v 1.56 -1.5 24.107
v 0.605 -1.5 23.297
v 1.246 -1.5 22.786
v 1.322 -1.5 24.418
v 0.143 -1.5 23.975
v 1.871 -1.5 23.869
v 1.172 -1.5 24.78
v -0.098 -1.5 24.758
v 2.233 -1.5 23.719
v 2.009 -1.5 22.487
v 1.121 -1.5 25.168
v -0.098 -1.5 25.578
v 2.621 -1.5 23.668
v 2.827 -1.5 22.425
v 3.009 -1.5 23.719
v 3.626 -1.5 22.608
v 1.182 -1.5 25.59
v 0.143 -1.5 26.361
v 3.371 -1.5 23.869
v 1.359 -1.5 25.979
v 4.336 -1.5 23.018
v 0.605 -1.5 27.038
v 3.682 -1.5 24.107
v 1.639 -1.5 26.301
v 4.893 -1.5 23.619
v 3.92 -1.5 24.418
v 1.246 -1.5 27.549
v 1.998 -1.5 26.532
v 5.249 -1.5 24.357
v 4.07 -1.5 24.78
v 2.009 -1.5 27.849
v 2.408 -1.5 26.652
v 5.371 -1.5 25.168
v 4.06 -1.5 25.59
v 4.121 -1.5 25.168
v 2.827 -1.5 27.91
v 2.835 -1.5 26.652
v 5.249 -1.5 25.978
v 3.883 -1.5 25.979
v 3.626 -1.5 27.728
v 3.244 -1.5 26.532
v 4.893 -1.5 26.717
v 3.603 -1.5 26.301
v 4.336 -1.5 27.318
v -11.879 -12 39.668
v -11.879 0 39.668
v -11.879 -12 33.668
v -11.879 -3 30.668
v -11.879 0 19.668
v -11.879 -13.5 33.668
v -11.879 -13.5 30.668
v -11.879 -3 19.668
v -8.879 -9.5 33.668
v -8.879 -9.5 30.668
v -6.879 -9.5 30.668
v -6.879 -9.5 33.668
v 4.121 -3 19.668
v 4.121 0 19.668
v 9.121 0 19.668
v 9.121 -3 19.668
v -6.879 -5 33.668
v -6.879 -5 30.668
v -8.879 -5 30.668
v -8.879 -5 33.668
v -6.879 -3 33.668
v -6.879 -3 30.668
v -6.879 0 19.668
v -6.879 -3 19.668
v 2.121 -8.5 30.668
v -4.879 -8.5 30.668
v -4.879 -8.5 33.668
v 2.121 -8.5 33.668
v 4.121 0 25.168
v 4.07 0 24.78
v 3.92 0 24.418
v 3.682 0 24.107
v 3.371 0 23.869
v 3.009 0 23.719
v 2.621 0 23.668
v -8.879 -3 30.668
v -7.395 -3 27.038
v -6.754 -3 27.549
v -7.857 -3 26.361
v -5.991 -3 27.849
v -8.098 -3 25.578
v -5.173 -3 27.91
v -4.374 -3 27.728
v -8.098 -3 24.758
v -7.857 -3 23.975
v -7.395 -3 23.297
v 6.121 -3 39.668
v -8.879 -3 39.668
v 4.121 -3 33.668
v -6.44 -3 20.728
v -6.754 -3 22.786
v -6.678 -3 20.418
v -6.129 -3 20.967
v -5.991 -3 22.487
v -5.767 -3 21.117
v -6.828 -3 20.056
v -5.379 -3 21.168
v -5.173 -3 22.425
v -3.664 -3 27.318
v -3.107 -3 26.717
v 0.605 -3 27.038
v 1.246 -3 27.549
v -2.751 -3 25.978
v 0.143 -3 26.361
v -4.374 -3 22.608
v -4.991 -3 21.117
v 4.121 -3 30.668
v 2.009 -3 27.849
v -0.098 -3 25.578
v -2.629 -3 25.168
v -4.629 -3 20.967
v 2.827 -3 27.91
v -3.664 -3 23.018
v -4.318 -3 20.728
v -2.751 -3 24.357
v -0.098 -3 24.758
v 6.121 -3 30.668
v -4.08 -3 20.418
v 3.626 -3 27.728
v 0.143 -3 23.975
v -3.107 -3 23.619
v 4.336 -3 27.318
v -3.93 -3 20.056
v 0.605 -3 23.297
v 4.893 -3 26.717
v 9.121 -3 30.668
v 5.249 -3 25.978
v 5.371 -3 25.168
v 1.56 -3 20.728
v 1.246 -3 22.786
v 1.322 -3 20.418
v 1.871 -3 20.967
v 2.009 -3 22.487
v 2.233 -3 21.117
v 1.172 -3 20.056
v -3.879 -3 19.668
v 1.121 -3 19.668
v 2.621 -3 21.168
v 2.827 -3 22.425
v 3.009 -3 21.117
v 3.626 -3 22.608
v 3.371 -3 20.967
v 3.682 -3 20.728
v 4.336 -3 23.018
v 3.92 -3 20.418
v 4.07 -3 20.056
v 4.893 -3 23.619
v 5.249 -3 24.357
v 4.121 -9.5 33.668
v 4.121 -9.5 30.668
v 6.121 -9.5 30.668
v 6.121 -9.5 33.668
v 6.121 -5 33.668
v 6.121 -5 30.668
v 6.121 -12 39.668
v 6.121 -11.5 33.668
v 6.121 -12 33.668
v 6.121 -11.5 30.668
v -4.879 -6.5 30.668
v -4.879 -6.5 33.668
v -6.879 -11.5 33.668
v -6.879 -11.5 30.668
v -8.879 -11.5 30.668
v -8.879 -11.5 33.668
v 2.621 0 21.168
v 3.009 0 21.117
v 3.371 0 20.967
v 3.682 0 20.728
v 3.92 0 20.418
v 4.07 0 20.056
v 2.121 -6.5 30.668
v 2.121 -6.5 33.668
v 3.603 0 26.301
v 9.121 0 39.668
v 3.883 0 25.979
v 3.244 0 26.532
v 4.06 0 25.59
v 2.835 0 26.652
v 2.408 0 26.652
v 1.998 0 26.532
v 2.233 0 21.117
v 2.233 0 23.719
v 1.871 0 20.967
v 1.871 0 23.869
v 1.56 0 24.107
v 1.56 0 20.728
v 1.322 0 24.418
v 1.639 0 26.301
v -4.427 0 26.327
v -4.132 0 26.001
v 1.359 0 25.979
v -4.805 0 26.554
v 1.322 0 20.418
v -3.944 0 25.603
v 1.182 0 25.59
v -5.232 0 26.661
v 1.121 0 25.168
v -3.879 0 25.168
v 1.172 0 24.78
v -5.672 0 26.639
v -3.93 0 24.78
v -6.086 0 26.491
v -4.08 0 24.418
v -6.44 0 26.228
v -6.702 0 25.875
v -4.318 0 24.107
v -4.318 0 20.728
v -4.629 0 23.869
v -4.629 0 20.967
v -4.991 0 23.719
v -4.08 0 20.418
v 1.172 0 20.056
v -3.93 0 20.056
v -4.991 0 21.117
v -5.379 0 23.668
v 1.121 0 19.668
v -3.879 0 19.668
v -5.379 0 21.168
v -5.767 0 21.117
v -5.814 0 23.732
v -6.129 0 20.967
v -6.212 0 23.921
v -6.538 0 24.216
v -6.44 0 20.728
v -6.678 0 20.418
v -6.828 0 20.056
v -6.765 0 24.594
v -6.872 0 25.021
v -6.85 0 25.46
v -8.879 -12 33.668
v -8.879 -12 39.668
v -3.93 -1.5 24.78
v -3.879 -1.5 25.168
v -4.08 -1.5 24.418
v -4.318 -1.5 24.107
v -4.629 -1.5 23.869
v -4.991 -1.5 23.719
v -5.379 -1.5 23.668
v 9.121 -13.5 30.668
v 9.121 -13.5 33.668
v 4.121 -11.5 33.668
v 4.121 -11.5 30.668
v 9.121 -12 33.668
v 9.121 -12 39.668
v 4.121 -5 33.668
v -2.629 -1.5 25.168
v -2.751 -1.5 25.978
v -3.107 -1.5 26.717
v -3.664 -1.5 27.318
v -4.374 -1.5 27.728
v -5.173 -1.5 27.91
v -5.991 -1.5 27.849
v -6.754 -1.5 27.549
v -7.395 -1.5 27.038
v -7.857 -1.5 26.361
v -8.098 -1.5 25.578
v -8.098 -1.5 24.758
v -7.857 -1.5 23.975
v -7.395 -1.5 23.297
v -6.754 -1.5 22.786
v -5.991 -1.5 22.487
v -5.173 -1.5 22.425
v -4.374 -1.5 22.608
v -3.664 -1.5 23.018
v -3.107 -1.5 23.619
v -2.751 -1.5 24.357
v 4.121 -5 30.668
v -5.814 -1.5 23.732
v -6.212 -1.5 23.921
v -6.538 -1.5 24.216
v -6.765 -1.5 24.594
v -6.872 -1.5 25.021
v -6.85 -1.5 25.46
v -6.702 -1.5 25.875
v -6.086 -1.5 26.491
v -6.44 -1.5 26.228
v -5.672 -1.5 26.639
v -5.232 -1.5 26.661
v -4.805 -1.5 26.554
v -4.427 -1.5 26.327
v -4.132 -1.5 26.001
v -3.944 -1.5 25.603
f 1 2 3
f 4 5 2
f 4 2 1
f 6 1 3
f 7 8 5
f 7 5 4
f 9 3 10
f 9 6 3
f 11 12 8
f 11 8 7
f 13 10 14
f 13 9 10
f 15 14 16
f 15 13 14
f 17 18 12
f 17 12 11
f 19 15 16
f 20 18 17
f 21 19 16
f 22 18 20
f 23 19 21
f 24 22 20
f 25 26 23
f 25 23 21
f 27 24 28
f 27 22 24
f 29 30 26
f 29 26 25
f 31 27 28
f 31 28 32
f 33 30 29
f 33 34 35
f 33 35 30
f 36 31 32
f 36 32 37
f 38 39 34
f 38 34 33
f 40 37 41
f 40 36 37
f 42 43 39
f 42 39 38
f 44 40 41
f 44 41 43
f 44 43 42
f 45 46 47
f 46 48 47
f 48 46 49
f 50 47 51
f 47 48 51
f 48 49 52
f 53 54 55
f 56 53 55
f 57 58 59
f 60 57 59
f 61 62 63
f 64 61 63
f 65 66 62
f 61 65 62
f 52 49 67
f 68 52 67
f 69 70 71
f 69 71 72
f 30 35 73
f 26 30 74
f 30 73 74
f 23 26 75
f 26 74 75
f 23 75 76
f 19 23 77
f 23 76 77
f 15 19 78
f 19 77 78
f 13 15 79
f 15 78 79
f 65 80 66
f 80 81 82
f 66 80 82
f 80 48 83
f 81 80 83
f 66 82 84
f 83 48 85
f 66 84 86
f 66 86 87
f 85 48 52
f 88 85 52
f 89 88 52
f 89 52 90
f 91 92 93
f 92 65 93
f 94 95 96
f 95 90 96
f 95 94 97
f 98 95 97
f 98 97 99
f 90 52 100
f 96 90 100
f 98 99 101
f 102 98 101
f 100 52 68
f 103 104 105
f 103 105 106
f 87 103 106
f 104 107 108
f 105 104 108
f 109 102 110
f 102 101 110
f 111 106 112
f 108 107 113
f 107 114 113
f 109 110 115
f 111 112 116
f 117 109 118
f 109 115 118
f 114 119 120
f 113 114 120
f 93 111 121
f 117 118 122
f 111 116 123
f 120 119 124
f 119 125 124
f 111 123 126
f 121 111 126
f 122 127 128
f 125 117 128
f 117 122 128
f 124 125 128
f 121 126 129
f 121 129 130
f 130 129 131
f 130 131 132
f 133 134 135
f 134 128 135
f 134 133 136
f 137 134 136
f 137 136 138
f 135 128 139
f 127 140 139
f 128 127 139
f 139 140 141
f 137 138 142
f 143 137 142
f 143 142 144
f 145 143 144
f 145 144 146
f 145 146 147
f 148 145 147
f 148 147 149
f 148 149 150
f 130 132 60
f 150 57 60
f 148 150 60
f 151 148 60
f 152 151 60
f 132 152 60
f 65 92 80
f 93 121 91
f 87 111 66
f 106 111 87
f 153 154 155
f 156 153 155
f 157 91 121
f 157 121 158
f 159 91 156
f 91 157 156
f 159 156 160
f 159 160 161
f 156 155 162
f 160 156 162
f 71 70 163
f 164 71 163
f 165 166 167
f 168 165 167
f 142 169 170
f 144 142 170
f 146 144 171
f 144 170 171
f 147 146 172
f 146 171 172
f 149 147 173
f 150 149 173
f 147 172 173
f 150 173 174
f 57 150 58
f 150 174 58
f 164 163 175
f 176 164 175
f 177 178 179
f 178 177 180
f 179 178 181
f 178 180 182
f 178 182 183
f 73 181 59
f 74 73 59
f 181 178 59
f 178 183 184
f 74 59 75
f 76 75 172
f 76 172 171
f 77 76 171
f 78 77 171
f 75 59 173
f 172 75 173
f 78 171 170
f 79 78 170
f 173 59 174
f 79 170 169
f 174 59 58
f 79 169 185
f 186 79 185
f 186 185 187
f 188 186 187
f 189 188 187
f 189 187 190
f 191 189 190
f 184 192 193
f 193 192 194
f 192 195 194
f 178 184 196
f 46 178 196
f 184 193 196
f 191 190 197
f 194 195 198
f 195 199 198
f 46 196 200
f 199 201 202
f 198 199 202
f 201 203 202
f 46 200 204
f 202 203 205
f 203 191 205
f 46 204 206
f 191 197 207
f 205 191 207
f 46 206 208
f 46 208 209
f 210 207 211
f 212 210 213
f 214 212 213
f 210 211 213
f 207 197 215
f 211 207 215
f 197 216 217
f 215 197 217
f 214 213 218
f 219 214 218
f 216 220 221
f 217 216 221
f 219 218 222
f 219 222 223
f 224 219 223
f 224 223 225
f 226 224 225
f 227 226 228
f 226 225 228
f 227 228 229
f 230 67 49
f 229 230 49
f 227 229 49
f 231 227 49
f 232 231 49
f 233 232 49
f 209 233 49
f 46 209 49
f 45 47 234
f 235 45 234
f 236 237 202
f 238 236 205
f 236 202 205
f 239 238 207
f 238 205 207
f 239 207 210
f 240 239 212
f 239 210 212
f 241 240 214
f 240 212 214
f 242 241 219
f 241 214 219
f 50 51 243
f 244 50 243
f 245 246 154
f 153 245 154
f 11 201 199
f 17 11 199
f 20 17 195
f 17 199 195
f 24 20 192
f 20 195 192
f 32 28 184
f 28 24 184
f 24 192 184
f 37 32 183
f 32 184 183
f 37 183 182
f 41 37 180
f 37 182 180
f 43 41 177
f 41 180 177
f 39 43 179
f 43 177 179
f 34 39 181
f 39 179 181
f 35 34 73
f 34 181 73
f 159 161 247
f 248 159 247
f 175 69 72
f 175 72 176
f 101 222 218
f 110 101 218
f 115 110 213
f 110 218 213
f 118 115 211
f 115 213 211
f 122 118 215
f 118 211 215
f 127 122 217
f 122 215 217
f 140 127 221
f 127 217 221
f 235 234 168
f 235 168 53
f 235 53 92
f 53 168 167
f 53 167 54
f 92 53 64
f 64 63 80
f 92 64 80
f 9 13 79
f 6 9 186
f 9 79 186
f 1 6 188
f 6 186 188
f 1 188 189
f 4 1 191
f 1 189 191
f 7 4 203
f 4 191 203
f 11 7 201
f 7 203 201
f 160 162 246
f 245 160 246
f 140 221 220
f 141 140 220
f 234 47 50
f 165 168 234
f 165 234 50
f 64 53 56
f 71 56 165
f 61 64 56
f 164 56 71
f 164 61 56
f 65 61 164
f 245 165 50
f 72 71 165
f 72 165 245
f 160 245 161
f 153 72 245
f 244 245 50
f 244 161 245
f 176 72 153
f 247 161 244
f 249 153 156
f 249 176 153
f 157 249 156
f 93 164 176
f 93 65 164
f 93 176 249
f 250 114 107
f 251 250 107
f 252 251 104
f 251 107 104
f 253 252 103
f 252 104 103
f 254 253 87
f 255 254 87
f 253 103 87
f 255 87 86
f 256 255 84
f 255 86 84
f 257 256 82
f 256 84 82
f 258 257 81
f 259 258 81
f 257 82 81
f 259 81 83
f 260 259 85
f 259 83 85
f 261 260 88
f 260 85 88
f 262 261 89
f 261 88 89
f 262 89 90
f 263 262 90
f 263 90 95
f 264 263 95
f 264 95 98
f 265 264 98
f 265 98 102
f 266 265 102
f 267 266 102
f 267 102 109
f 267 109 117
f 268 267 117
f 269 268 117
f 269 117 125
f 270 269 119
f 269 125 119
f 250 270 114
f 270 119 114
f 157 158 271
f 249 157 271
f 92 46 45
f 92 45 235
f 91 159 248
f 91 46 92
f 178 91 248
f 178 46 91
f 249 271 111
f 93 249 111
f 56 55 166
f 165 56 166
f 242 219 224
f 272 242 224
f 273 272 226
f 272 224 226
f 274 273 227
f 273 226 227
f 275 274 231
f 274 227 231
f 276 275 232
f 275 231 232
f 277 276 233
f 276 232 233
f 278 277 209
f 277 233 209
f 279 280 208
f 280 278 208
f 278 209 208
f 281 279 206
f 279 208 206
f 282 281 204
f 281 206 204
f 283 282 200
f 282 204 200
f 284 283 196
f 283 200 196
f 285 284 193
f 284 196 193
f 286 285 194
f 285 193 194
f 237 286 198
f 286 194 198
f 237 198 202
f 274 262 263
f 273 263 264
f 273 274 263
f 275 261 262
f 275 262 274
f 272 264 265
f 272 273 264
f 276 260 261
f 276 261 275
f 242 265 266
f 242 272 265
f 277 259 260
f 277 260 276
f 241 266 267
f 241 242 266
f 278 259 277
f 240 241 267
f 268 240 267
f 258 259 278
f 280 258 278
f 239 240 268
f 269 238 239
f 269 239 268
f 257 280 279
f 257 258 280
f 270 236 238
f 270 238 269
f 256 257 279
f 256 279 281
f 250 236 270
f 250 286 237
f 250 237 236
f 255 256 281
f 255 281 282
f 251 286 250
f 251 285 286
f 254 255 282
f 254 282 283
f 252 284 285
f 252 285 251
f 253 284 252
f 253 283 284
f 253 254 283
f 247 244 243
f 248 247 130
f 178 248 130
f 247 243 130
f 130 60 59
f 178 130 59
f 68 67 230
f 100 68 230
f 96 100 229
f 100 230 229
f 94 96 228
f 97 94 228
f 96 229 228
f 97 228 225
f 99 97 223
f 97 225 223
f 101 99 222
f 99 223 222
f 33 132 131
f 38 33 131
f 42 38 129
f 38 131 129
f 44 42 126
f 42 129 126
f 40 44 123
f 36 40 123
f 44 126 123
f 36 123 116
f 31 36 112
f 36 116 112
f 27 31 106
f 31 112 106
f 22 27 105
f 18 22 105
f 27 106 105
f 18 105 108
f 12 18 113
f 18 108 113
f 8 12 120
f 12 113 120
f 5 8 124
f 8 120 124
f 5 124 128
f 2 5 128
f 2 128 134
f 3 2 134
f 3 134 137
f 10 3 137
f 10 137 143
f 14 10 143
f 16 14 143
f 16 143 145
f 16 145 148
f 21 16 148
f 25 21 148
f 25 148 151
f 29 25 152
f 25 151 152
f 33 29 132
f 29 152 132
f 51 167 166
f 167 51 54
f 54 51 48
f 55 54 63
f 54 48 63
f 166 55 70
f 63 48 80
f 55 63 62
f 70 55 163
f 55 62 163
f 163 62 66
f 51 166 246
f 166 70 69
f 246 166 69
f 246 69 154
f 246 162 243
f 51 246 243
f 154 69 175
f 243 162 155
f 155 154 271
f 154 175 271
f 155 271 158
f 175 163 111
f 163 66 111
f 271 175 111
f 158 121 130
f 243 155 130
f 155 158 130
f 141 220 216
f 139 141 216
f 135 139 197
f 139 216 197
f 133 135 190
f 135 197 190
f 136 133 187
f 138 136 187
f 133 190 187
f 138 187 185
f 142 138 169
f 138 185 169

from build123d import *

# Parameters (mm, degrees)
F0_DEPTH = 3
F5_DEPTH = 9
F1_W     = 7
F1_H     = 2
F6_DEPTH = 3
F2_R     = 2.75
F2_R_2   = 1.5
F3_DEPTH = 1.5


with BuildPart() as f0:
    # F4 (on Front) → F0 (new body)
    with BuildSketch(Plane.XZ):
        with BuildLine():
            ThreePointArc((-5.3789273798, 23.6677408814), (-6.4395875516, 26.2284010532), (-3.8789273798, 25.1677408814))
            Line((-3.8789273798, 25.1677408814), (1.1210726202, 25.1677408814))
            ThreePointArc((1.1210726202, 25.1677408814), (2.6210726202, 26.6677408814), (4.1210726202, 25.1677408814))
            ThreePointArc((4.1210726202, 25.1677408814), (3.6817327919, 24.1070807097), (2.6210726202, 23.6677408814))
            Line((2.6210726202, 23.6677408814), (2.6210726202, 21.1677408814))
            ThreePointArc((2.6210726202, 21.1677408814), (3.6817327919, 20.7284010532), (4.1210726202, 19.6677408814))
            Line((4.1210726202, 19.6677408814), (9.1210726202, 19.6677408814))
            Line((9.1210726202, 19.6677408814), (9.1210726202, 30.6677408814))
            Line((9.1210726202, 30.6677408814), (-11.8789273798, 30.6677408814))
            Line((-11.8789273798, 30.6677408814), (-11.8789273798, 19.6677408814))
            Line((-11.8789273798, 19.6677408814), (-6.8789273798, 19.6677408814))
            ThreePointArc((-6.8789273798, 19.6677408814), (-6.4395875516, 20.7284010532), (-5.3789273798, 21.1677408814))
            Line((-5.3789273798, 21.1677408814), (-5.3789273798, 23.6677408814))
        make_face()
        with BuildLine():
            Line((1.1210726202, 25.1677408814), (-3.8789273798, 25.1677408814))
            ThreePointArc((-3.8789273798, 25.1677408814), (-4.3182672081, 24.1070807097), (-5.3789273798, 23.6677408814))
            Line((-5.3789273798, 23.6677408814), (-5.3789273798, 21.1677408814))
            ThreePointArc((-5.3789273798, 21.1677408814), (-4.3182672081, 20.7284010532), (-3.8789273798, 19.6677408814))
            Line((-3.8789273798, 19.6677408814), (1.1210726202, 19.6677408814))
            ThreePointArc((1.1210726202, 19.6677408814), (1.5604124484, 20.7284010532), (2.6210726202, 21.1677408814))
            Line((2.6210726202, 21.1677408814), (2.6210726202, 23.6677408814))
            ThreePointArc((2.6210726202, 23.6677408814), (1.5604124484, 24.1070807097), (1.1210726202, 25.1677408814))
        make_face()
    extrude(amount=F0_DEPTH)

    # F1 (on face) → F5 (join)
    with BuildSketch(Plane.XY.offset(30.6677408814)):
        Polygon((9.1210726202, 0), (-11.8789273798, 0), (-11.8789273798, -3), (-8.8789273798, -3), (-6.8789273798, -3), (4.1210726202, -3), (6.1210726202, -3), (9.1210726202, -3), align=None)
        Polygon((-8.8789273798, -3), (-11.8789273798, -3), (-11.8789273798, -12), (-8.8789273798, -12), (-8.8789273798, -11.5), (-8.8789273798, -9.5), (-8.8789273798, -5), align=None)
        Polygon((9.1210726202, -12), (9.1210726202, -3), (6.1210726202, -3), (6.1210726202, -5), (6.1210726202, -9.5), (6.1210726202, -11.5), (6.1210726202, -12), align=None)
    extrude(amount=F5_DEPTH)

    # F1 (on face) → F6 (join)
    with BuildSketch(Plane.XY.offset(30.6677408814)):
        Polygon((-8.8789273798, -11.5), (-8.8789273798, -12), (4.6210726202, -12), (6.1210726202, -12), (6.1210726202, -11.5), (4.1210726202, -11.5), (4.1210726202, -9.5), (6.1210726202, -9.5), (6.1210726202, -5), (4.1210726202, -5), (4.1210726202, -3), (-6.8789273798, -3), (-6.8789273798, -5), (-8.8789273798, -5), (-8.8789273798, -9.5), (-6.8789273798, -9.5), (-6.8789273798, -11.5), align=None)
        with Locations((-1.3789273798, -7.5)):
            Rectangle(F1_W, F1_H, mode=Mode.SUBTRACT)
        Polygon((-8.8789273798, -12), (-11.8789273798, -12), (-11.8789273798, -13.5), (9.1210726202, -13.5), (9.1210726202, -12), (6.1210726202, -12), (4.6210726202, -12), align=None)
    extrude(amount=F6_DEPTH)

    # F2 (on face) → F3 (cut)
    with BuildSketch(Plane.XZ.offset(3)):
        with Locations((2.6210726202, 25.1677408814)):
            Circle(F2_R)
        with Locations((2.6210726202, 25.1677408814)):
            Circle(F2_R_2, mode=Mode.SUBTRACT)
        with Locations((-5.3789273798, 25.1677408814)):
            Circle(F2_R)
        with Locations((-5.3789273798, 25.1677408814)):
            Circle(F2_R_2, mode=Mode.SUBTRACT)
    extrude(amount=-F3_DEPTH, mode=Mode.SUBTRACT)


solid = f0.part
